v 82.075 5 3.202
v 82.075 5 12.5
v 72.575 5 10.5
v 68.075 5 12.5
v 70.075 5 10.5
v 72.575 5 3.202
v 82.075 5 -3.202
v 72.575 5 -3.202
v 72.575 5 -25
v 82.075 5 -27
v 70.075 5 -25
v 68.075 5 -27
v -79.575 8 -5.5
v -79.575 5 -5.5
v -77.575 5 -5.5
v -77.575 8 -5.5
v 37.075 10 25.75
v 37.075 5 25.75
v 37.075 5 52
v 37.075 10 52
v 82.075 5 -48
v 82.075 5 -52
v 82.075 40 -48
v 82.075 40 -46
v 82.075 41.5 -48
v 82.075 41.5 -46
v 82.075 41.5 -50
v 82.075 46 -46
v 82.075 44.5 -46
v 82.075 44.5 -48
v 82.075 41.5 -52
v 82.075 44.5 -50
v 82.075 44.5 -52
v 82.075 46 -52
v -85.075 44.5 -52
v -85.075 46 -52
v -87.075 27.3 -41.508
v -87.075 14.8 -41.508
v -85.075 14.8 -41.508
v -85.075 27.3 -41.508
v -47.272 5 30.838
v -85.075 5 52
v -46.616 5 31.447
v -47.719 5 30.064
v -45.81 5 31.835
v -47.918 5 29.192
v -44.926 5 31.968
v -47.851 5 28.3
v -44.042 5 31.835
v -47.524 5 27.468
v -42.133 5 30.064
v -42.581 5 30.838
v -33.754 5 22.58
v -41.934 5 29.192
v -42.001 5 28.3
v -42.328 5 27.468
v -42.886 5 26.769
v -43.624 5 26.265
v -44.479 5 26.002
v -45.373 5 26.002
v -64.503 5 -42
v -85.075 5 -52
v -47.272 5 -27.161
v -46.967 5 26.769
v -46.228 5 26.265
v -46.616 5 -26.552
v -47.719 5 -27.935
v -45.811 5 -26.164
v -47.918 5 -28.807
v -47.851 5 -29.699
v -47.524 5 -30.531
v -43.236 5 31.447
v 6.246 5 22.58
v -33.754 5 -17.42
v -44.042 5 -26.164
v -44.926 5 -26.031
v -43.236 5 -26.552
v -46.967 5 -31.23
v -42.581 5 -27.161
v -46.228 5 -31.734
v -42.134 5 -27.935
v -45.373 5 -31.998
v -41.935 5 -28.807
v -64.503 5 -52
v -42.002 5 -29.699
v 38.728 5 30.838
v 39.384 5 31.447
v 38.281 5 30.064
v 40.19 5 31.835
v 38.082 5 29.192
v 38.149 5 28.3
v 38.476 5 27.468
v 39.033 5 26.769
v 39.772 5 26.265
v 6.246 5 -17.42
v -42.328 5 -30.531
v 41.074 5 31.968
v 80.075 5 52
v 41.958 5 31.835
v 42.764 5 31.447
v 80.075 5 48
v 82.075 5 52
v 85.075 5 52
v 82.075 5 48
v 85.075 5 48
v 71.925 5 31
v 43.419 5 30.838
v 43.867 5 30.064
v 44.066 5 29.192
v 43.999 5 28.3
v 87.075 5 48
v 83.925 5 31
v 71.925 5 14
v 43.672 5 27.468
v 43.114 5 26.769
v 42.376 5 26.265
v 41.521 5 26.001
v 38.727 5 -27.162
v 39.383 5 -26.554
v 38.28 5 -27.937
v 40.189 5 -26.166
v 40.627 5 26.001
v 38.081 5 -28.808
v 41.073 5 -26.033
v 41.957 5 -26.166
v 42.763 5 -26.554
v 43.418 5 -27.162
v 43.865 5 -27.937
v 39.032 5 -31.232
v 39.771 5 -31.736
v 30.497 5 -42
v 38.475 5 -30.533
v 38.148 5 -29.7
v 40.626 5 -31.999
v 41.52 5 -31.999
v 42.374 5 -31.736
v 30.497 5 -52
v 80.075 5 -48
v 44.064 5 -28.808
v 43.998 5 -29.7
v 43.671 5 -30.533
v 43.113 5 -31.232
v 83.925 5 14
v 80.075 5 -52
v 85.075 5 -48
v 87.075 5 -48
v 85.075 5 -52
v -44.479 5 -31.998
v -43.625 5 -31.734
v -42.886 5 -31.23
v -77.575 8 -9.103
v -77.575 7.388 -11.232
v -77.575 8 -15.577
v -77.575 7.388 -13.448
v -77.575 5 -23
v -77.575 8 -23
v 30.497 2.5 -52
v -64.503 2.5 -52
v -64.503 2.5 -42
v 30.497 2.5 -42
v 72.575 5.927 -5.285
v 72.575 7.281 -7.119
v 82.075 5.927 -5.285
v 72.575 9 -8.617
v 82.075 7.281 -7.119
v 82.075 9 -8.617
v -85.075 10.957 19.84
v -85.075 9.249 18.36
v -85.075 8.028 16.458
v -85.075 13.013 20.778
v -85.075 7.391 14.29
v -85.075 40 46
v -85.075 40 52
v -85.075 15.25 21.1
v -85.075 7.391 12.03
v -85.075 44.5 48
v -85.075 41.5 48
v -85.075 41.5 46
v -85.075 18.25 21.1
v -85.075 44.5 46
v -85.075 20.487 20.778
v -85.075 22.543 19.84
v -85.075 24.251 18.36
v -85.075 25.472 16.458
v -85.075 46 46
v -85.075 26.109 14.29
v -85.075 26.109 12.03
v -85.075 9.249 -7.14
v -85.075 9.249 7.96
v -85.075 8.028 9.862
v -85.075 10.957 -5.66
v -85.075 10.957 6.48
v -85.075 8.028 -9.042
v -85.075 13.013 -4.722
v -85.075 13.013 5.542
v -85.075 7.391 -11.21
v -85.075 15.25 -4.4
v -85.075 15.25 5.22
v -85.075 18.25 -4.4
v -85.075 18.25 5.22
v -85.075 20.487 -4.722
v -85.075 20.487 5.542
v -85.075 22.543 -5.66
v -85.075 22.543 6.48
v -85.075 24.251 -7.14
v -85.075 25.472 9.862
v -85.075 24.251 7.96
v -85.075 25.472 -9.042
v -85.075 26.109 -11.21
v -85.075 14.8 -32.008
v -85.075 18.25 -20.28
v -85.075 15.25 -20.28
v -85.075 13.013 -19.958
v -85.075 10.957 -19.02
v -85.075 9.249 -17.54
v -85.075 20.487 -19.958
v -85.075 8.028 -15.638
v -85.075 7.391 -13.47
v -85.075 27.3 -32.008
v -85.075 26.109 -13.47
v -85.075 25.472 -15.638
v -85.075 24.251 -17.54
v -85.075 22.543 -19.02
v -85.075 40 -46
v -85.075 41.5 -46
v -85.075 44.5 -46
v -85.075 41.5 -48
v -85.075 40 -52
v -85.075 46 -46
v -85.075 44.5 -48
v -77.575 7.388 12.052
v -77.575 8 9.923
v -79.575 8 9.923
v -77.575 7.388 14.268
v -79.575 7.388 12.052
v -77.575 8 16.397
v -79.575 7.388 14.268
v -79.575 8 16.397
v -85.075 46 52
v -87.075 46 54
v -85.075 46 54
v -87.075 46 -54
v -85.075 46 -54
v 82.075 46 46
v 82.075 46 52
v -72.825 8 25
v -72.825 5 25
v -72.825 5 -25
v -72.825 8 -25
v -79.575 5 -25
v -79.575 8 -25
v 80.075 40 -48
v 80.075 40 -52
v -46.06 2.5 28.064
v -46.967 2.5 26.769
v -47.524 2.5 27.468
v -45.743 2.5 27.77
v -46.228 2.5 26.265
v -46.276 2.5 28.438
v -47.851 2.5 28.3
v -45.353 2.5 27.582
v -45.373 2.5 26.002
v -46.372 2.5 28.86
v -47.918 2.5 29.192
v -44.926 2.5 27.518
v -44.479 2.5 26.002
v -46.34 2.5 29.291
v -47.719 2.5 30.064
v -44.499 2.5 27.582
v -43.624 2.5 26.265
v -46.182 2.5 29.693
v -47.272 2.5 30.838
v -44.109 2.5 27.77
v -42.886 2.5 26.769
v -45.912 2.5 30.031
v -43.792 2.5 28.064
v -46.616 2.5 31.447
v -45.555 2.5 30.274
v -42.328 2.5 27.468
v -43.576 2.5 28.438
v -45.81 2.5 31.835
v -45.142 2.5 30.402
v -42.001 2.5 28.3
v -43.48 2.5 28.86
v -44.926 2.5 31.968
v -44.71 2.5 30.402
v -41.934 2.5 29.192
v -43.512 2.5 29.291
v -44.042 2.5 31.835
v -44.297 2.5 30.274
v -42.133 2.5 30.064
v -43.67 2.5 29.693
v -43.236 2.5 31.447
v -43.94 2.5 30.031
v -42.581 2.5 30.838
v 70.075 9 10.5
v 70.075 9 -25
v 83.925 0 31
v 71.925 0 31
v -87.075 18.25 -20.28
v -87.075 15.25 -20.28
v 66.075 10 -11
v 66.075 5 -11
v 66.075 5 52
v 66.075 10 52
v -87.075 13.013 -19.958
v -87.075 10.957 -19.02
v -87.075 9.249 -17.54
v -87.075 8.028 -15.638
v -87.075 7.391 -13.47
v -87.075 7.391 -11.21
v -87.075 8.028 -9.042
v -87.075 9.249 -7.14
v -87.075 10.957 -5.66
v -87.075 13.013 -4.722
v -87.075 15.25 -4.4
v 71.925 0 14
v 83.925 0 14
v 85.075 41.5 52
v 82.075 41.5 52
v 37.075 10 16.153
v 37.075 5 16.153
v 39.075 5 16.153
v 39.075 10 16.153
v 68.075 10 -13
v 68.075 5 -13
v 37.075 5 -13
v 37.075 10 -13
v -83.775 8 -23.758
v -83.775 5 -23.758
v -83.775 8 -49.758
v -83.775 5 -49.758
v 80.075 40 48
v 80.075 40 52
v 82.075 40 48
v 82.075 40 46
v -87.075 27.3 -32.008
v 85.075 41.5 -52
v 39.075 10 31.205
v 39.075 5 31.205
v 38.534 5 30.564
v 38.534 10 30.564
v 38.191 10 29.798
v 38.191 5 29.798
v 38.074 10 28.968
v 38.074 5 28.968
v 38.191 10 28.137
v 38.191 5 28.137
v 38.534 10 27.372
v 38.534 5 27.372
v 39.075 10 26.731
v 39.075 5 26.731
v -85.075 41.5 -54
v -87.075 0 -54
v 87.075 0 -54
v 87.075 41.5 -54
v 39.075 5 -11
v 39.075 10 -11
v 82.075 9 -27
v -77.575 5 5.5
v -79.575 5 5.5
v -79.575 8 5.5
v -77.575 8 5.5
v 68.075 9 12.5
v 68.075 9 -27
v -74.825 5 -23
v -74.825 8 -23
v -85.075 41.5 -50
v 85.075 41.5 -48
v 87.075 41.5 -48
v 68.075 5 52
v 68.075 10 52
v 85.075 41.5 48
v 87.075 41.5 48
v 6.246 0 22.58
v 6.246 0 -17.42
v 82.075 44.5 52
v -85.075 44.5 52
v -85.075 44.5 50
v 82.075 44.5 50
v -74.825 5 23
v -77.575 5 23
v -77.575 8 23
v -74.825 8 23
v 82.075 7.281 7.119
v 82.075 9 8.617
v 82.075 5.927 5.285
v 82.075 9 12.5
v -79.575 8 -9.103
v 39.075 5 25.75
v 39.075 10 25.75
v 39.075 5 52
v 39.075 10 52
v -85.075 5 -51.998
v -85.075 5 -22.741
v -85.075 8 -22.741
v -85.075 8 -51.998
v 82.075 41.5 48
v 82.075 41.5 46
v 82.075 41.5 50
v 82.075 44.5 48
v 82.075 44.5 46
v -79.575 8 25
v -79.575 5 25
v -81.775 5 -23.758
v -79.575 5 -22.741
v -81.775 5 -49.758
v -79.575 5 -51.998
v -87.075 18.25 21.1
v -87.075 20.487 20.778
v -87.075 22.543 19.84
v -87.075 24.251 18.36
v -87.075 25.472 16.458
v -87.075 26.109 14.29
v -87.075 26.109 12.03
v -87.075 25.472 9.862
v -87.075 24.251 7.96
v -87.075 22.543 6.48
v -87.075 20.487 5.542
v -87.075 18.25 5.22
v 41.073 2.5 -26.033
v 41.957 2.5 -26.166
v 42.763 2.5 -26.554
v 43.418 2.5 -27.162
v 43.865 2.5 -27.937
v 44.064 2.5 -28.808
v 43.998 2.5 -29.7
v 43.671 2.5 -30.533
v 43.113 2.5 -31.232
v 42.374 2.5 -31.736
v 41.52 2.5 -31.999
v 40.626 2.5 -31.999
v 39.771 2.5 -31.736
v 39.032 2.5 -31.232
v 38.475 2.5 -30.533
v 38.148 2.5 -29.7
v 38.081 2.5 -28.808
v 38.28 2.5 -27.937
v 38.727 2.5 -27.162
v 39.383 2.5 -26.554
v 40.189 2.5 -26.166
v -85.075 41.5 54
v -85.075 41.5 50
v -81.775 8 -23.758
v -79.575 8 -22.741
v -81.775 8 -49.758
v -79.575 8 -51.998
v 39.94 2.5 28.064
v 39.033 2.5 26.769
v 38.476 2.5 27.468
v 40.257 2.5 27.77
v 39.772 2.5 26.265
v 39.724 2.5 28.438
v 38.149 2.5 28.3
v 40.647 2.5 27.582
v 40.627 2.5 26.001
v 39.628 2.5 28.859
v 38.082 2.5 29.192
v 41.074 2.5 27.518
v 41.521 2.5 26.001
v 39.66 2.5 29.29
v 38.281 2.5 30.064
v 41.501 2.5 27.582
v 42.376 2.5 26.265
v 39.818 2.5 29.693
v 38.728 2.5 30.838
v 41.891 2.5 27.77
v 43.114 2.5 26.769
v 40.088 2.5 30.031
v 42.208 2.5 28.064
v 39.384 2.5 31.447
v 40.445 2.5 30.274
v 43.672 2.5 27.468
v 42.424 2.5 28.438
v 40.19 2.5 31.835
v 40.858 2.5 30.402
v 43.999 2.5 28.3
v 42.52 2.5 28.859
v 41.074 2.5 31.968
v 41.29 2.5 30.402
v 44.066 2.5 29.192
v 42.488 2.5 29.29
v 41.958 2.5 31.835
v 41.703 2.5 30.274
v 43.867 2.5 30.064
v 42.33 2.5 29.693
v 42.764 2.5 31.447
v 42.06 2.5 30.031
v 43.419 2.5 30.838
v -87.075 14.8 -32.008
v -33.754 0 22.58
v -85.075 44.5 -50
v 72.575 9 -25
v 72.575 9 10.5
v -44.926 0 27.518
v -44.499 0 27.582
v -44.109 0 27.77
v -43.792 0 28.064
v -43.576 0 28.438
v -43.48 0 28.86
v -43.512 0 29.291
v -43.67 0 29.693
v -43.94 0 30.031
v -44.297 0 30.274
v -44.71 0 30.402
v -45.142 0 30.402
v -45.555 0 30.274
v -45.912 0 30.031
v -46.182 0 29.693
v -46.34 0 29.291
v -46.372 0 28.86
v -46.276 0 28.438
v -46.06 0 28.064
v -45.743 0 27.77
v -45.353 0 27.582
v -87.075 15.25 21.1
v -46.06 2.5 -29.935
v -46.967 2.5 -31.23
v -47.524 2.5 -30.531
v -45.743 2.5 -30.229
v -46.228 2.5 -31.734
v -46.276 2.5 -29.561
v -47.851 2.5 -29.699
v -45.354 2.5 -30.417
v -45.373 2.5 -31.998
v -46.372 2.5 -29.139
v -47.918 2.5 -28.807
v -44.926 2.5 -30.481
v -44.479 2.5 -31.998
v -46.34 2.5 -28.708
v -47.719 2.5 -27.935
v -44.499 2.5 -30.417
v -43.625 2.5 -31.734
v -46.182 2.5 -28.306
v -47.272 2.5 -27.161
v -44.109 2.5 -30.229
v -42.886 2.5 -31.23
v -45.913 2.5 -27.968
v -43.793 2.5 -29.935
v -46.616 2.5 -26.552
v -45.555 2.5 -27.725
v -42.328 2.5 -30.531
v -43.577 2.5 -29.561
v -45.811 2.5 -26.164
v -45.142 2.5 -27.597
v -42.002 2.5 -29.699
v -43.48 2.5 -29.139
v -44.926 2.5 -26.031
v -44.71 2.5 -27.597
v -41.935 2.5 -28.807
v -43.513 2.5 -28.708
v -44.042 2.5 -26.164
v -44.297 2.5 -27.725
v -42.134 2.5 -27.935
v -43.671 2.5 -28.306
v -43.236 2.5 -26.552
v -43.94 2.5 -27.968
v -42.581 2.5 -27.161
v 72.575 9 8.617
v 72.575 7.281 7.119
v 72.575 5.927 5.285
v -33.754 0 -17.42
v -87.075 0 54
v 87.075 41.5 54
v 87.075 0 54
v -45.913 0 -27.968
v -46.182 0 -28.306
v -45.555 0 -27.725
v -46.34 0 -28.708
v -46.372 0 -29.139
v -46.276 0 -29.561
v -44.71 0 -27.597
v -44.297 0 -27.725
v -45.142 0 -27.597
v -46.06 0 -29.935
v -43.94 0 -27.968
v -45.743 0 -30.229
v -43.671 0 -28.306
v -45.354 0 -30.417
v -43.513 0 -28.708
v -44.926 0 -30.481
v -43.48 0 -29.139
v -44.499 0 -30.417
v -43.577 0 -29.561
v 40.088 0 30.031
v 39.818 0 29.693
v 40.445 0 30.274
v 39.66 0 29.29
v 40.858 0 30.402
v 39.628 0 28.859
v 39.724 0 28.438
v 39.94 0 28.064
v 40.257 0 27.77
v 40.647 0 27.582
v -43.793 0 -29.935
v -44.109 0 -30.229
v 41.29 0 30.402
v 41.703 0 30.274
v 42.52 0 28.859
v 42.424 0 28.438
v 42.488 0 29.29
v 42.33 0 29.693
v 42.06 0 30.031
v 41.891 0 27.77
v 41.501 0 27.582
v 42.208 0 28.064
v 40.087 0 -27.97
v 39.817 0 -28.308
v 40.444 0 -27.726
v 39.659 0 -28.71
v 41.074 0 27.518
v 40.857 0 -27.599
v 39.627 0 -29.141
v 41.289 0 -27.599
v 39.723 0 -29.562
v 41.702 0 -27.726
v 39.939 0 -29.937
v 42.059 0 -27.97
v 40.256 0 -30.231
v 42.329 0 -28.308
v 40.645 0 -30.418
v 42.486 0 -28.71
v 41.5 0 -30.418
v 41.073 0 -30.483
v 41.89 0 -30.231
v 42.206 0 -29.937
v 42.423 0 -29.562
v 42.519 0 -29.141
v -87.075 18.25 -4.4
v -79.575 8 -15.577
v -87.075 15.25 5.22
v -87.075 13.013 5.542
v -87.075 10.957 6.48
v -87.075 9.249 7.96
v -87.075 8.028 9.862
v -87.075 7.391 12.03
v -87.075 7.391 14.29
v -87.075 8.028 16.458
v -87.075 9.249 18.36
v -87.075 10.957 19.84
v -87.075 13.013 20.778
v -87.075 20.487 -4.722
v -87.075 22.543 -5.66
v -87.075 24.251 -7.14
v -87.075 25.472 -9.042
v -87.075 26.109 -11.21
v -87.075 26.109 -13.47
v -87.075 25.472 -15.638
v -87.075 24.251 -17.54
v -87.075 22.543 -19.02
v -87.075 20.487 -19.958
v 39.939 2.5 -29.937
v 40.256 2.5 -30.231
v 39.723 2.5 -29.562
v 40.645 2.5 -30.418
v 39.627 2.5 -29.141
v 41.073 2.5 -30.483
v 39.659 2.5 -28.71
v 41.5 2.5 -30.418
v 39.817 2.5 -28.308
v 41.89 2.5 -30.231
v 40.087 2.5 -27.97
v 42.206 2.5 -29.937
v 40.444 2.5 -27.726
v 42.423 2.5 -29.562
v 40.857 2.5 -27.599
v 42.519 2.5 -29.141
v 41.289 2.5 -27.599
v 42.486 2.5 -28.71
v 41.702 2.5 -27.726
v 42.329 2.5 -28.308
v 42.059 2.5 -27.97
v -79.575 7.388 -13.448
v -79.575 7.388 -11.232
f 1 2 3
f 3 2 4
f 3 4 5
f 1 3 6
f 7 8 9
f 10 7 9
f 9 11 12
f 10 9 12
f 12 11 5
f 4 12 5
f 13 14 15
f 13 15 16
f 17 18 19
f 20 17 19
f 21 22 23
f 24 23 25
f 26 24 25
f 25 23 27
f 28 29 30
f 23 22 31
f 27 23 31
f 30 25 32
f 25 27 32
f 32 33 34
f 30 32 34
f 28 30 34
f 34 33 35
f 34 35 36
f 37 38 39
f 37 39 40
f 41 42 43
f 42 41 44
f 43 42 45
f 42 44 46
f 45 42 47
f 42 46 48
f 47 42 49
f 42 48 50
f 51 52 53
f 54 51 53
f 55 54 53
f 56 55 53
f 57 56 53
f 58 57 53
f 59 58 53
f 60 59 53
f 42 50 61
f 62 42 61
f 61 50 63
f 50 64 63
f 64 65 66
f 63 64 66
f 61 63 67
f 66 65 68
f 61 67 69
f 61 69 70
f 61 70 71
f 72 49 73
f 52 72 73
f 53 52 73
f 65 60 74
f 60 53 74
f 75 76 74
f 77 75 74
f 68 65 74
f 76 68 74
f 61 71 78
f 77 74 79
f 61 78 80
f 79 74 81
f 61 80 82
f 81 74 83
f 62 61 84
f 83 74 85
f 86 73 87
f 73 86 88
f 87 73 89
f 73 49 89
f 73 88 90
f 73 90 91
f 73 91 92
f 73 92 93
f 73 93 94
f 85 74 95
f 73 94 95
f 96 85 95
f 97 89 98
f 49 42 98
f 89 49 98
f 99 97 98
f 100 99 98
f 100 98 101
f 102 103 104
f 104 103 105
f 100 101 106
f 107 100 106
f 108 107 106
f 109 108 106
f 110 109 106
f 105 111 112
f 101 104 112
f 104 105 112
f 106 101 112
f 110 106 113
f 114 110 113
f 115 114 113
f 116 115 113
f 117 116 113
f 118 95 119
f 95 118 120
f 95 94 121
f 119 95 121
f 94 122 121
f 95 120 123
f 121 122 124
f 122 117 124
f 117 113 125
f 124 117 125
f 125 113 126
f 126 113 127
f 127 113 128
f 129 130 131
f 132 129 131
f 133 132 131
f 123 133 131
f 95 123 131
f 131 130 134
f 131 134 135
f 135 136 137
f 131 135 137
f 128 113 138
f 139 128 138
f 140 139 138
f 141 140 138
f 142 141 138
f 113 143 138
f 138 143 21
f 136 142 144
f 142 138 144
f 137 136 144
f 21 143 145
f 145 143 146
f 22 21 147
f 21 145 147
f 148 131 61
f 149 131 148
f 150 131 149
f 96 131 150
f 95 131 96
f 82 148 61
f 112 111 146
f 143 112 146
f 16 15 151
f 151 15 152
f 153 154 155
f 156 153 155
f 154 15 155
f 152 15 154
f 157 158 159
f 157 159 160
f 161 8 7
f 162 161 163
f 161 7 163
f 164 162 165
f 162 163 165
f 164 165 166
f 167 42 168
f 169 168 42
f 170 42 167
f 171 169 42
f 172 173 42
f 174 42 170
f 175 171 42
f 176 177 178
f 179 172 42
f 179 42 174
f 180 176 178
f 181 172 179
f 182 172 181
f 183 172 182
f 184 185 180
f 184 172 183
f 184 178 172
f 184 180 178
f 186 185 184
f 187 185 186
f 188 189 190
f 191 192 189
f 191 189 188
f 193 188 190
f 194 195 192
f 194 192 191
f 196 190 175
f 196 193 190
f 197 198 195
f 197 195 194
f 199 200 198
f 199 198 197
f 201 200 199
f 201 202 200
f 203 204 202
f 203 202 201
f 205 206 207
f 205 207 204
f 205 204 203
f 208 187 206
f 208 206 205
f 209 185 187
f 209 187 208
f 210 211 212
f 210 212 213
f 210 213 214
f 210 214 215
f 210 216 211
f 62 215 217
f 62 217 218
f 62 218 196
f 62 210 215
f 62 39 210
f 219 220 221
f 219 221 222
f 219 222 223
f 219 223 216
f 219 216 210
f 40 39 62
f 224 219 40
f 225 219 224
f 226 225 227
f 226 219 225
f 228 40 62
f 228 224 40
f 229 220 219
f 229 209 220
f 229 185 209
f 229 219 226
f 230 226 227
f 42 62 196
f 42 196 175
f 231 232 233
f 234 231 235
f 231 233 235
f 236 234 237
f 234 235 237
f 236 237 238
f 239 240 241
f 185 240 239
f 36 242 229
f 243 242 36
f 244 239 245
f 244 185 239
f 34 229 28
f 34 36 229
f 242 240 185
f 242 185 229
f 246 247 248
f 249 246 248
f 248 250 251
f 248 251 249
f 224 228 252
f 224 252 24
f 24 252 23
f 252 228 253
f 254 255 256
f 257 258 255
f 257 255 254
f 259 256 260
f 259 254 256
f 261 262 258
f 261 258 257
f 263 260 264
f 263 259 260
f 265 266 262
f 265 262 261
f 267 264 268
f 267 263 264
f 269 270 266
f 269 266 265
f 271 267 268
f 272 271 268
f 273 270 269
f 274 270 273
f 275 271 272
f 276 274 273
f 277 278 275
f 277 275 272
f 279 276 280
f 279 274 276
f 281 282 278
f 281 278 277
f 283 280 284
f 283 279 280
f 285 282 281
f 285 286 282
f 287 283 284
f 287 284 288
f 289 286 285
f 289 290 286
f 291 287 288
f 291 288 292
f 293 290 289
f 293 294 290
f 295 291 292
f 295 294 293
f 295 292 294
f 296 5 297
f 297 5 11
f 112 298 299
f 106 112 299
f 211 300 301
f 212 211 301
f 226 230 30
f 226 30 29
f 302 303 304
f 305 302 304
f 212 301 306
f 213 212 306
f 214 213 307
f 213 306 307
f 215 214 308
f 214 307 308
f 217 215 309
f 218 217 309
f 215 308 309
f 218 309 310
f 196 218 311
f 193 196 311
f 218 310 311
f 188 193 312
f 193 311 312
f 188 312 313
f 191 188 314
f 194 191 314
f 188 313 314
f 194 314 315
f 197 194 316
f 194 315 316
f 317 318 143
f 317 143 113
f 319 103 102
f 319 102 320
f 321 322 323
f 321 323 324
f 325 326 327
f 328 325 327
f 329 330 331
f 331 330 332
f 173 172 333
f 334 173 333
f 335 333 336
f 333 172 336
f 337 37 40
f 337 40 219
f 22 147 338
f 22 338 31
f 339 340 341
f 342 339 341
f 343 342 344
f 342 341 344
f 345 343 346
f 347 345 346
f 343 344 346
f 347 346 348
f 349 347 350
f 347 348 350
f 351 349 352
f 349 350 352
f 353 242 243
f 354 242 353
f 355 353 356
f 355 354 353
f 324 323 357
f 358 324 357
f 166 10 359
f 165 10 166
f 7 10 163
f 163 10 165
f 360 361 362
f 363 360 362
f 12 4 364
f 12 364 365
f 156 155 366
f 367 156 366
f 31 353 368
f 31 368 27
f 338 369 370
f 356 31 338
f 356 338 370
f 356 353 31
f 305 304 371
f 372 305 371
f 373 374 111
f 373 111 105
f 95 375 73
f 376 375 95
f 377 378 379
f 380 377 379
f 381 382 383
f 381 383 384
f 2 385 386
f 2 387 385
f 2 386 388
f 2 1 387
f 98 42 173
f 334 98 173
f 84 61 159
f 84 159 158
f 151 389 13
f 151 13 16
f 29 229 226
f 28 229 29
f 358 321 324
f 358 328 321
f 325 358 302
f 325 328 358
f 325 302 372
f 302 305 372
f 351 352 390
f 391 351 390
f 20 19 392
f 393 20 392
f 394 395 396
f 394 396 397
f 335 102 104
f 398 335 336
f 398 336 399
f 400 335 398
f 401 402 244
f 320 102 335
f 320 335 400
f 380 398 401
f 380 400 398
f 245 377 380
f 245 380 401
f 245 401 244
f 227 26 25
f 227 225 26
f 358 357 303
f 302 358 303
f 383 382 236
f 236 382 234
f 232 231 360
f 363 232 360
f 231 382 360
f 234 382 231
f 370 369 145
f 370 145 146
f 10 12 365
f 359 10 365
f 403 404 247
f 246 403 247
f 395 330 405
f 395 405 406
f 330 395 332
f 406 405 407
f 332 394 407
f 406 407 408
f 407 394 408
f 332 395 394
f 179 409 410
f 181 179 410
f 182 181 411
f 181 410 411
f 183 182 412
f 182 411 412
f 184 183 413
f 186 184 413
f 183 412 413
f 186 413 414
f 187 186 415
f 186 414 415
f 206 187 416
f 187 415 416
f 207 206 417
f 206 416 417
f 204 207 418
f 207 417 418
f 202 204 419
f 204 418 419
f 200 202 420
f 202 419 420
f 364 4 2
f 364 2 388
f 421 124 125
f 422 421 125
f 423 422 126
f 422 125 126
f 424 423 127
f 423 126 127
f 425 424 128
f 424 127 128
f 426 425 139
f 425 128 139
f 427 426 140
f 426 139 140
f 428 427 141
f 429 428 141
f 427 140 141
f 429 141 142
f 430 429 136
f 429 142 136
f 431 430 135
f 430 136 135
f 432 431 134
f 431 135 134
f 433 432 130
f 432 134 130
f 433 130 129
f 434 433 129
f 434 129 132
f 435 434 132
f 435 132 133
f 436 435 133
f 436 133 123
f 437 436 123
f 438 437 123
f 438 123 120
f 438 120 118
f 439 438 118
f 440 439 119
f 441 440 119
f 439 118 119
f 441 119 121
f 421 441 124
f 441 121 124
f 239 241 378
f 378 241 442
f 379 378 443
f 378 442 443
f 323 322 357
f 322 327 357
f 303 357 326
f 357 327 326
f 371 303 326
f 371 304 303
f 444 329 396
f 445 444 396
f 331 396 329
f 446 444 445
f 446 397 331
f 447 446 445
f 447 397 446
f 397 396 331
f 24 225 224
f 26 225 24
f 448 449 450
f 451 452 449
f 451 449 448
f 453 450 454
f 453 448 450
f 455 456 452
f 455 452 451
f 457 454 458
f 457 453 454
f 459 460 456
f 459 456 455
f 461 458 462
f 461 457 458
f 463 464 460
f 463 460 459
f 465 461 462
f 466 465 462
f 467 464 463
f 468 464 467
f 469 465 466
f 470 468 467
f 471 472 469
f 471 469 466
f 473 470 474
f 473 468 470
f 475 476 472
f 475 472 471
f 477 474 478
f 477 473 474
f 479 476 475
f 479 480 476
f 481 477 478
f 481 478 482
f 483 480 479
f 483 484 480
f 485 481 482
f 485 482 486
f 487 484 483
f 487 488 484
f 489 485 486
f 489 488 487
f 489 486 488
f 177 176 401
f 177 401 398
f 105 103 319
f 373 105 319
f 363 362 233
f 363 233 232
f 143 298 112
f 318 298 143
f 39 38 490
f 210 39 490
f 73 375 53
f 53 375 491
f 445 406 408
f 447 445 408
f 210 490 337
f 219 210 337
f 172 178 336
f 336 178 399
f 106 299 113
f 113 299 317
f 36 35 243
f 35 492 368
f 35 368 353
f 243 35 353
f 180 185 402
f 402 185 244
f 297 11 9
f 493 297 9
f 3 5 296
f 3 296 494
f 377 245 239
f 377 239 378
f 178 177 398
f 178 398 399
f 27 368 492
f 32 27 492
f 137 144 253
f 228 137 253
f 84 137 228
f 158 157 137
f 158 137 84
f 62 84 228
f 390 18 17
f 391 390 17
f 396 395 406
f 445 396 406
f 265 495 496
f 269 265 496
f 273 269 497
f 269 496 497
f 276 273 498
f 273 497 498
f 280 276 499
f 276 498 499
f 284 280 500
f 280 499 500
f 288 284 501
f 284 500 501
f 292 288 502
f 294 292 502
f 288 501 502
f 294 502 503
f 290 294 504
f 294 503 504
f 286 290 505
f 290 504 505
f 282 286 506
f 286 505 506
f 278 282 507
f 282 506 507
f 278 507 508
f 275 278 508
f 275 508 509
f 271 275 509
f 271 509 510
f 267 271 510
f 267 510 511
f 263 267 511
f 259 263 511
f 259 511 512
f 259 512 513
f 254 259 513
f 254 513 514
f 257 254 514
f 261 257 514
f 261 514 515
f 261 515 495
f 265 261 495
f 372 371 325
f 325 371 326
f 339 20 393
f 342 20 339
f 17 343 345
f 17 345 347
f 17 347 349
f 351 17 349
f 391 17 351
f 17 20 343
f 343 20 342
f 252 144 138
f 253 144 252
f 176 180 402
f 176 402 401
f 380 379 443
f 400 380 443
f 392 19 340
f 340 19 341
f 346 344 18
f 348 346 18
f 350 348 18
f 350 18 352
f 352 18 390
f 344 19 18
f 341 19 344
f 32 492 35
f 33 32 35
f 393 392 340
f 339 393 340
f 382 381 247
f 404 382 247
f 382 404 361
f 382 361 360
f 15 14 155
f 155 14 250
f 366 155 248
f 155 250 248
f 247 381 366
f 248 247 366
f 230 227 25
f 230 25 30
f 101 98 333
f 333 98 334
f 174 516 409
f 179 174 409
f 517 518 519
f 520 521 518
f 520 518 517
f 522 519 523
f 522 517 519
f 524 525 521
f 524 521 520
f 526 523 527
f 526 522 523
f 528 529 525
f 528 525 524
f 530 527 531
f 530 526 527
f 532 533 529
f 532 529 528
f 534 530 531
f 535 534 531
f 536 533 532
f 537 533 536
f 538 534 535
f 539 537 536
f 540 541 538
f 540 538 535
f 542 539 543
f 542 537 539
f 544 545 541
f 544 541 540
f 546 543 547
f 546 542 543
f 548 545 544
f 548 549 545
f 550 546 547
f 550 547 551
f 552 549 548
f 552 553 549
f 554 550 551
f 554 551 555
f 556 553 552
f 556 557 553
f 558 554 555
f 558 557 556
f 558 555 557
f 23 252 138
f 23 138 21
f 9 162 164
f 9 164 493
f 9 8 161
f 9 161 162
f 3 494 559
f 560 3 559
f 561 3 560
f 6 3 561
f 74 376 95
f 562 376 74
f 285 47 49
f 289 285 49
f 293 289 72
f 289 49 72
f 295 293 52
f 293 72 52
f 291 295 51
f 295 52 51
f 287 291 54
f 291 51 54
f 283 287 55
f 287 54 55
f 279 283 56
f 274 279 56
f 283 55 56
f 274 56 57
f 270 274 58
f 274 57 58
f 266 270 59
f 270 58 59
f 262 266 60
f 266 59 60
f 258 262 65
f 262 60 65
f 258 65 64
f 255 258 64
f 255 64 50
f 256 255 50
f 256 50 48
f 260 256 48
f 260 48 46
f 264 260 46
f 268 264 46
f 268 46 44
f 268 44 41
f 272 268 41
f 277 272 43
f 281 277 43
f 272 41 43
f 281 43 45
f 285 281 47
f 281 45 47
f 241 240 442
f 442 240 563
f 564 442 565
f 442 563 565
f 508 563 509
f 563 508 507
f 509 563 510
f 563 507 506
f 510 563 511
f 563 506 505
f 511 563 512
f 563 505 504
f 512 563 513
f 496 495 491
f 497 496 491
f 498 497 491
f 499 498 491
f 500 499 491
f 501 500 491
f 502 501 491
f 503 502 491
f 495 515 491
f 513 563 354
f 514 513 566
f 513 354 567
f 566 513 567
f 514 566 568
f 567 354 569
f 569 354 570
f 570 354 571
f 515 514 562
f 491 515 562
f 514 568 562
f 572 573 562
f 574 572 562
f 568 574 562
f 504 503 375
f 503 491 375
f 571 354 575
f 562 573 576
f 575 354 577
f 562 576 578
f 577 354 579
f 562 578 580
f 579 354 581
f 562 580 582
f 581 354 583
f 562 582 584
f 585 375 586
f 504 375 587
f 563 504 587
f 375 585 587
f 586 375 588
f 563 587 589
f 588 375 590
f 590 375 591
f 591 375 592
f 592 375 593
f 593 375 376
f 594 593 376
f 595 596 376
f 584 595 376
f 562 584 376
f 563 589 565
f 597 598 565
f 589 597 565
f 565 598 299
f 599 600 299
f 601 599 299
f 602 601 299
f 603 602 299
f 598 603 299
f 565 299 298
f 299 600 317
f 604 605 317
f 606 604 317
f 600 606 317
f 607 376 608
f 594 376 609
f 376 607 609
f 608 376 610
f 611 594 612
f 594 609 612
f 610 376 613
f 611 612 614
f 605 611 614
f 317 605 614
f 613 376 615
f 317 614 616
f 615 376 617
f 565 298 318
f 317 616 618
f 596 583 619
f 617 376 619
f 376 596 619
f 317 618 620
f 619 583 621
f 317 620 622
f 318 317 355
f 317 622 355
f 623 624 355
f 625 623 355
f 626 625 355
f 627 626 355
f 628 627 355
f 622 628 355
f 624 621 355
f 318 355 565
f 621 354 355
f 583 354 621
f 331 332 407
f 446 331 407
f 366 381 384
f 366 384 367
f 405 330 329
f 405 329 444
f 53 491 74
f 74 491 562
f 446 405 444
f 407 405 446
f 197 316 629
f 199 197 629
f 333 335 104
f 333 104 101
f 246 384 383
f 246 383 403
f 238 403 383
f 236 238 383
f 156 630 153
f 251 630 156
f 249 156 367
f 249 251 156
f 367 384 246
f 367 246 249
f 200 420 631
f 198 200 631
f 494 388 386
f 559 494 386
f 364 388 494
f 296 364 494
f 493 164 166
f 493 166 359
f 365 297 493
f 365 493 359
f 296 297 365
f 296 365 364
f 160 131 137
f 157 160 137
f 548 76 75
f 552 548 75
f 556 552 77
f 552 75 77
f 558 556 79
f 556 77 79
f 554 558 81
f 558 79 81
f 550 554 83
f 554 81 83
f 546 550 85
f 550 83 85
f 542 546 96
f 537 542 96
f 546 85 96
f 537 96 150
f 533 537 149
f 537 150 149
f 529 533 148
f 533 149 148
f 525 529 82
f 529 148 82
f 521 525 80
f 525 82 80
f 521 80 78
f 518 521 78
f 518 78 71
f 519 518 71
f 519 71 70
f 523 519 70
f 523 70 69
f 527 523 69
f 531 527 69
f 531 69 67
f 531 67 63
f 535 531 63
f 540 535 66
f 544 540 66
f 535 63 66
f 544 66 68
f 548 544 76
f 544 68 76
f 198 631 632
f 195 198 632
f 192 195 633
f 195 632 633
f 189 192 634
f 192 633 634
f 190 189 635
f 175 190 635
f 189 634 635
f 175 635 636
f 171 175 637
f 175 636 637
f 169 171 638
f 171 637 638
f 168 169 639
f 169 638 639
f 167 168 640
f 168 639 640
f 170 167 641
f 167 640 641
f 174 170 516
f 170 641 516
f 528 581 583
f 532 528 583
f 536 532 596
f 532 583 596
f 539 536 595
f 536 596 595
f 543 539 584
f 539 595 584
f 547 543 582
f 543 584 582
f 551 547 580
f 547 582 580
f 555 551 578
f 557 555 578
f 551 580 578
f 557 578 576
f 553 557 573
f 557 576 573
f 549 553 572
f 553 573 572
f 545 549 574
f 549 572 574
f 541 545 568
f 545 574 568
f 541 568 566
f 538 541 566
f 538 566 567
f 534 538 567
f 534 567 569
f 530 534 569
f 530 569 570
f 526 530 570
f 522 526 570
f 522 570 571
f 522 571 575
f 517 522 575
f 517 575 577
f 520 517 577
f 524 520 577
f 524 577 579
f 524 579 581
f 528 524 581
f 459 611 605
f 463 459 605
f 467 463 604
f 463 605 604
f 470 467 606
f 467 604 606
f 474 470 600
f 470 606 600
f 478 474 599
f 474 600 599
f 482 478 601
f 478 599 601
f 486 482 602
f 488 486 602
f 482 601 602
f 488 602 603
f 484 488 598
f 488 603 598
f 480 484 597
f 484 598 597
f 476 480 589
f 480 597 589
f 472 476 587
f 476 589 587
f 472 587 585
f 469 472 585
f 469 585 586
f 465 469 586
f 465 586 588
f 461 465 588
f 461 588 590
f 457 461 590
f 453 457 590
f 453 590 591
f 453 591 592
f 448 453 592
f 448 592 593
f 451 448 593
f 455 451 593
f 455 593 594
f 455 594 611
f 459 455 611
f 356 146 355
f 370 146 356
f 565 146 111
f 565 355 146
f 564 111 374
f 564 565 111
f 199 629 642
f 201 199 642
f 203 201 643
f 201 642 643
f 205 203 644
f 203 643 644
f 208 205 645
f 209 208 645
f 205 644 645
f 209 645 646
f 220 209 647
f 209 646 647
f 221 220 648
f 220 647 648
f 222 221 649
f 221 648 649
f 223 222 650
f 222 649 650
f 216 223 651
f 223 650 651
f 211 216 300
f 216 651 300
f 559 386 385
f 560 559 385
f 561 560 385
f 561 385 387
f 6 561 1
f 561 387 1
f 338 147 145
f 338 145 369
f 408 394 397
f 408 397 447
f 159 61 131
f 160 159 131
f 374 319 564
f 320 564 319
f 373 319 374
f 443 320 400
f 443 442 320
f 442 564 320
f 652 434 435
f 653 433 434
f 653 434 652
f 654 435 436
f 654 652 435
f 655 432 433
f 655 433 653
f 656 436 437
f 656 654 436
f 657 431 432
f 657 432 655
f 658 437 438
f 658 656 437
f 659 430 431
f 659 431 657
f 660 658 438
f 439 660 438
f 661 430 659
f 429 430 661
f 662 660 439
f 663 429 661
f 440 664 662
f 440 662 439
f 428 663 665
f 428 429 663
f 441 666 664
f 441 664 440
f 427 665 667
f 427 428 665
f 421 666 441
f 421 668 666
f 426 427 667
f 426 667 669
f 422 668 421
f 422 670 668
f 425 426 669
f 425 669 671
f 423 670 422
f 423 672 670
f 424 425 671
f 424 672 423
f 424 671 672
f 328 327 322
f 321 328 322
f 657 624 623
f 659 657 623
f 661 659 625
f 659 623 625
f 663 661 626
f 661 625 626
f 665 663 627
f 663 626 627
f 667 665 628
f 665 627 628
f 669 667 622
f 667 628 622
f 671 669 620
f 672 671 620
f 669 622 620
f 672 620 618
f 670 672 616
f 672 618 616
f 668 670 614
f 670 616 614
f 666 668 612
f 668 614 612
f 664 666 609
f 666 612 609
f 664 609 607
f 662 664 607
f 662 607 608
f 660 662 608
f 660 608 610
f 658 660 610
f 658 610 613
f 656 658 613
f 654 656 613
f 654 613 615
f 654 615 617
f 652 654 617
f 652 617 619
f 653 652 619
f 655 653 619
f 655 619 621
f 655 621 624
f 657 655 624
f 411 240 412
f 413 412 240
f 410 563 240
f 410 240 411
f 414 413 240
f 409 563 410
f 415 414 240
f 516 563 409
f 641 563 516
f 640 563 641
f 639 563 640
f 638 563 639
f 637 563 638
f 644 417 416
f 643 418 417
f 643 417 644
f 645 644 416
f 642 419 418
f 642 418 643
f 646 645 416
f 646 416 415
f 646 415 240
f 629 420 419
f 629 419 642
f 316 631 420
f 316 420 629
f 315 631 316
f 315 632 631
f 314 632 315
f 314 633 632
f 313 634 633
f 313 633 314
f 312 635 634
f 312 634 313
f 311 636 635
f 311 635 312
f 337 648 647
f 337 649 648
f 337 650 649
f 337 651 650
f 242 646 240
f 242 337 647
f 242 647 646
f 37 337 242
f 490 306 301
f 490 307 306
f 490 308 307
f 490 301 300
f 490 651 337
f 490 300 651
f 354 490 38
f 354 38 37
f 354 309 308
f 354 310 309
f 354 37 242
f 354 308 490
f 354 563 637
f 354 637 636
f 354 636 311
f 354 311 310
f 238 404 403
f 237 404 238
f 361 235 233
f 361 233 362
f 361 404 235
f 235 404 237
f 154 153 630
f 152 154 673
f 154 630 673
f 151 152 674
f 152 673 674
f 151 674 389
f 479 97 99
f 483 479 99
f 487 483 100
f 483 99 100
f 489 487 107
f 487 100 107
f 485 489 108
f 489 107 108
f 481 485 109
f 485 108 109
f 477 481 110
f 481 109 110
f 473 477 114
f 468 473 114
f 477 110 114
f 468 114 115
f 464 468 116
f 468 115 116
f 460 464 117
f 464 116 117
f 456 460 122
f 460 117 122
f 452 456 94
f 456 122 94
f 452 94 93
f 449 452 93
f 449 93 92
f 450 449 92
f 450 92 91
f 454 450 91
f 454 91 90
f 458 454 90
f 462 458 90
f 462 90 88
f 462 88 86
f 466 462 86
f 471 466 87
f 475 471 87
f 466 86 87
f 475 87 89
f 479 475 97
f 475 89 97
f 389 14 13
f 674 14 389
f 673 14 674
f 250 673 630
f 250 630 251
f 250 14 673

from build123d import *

# Parameters (mm, degrees)
SKETCH_1_W           = 174.15
SKETCH_1_H           = 108
EXTRUDE_1_DEPTH      = 63
SKETCH_2_W           = 104
SKETCH_2_H           = 56
CUT_EXTRUDE_1_DEPTH  = 172.15
SKETCH_3_W           = 174.15
SKETCH_3_H           = 108
CUT_EXTRUDE_2_DEPTH  = 2
CUT_EXTRUDE_3_DEPTH  = 10
SKETCH_4_W           = 6.75
SKETCH_4_H           = 50
SKETCH_4_W_2         = 2.75
SKETCH_4_H_2         = 46
EXTRUDE_2_DEPTH      = 3
SKETCH_6_R           = 7.94
CUT_EXTRUDE_4_DEPTH  = 3
SKETCH_7_W           = 11
SKETCH_7_H           = 3
CUT_EXTRUDE_5_DEPTH  = 3
SKETCH_13_W          = 6.5
SKETCH_13_H          = 39.5
SKETCH_13_W_2        = 2.5
SKETCH_13_H_2        = 35.5
EXTRUDE_5_DEPTH      = 4
SKETCH_14_W          = 39.5
SKETCH_14_H          = 4
EXTRUDE_6_DEPTH      = 12.5
CUT_EXTRUDE_9_DEPTH  = 14.5
SKETCH_16_R          = 1.45
SKETCH_16_W          = 12
SKETCH_16_H          = 17
CUT_EXTRUDE_10_DEPTH = 5
SKETCH_17_R          = 3
CUT_EXTRUDE_11_DEPTH = 2.5
EXTRUDE_7_DEPTH      = 5
SKETCH_20_W          = 9.597876209
SKETCH_20_H          = 5
CUT_EXTRUDE_13_DEPTH = 5
SKETCH_22_W          = 174.15
SKETCH_22_H          = 108
CUT_EXTRUDE_14_DEPTH = 15
SKETCH_29_W          = 40
SKETCH_29_H          = 40
CUT_EXTRUDE_21_DEPTH = 5
SKETCH_30_W          = 95
SKETCH_30_H          = 10
CUT_EXTRUDE_22_DEPTH = 2.5
SKETCH_36_W          = 172.15
SKETCH_36_H          = 6
EXTRUDE_12_DEPTH     = 6
CUT_EXTRUDE_START    = -174.15
CUT_EXTRUDE_27_DEPTH = 174.15
SKETCH_38_W          = 88
SKETCH_38_H          = 4.5
CUT_EXTRUDE_28_DEPTH = 10
SKETCH_41_W          = 2
SKETCH_41_H          = 108
EXTRUDE_15_DEPTH     = 4.5
CUT_EXTRUDE_START_2  = -41
CUT_EXTRUDE_29_DEPTH = 41
SKETCH_43_W          = 2
SKETCH_43_H          = 35
EXTRUDE_17_DEPTH     = 4
SKETCH_44_W          = 2
SKETCH_44_H          = 35
EXTRUDE_18_DEPTH     = 4
SKETCH_48_W          = 9.5
SKETCH_48_H          = 12.5
CUT_EXTRUDE_30_DEPTH = 10
SKETCH_49_W          = 5.5
SKETCH_49_H          = 29.256745024
SKETCH_49_W_2        = 2
SKETCH_49_H_2        = 26
EXTRUDE_19_DEPTH     = 3
SKETCH_51_W          = 2
SKETCH_51_H          = 104
CUT_EXTRUDE_31_DEPTH = 4.5
SKETCH_52_W          = 2
SKETCH_52_H          = 35
EXTRUDE_20_DEPTH     = 4
SKETCH_53_W          = 2
SKETCH_53_H          = 35
EXTRUDE_21_DEPTH     = 4


# Read off the part's stored shape, not the designer's step: 컷-돌출29
with BuildPart() as part:
    # 스케치1 → 보스-돌출1 (new body)
    with BuildSketch(Plane(origin=(0, 0, 0), x_dir=(1, 0, 0), z_dir=(0, 1, 0))):
        Rectangle(SKETCH_1_W, SKETCH_1_H)
    extrude(amount=EXTRUDE_1_DEPTH)

    # 스케치2 → 컷-돌출1 (cut)
    with BuildSketch(Plane(origin=(87.075, 0, 0), x_dir=(0, 0, -1), z_dir=(1, 0, 0))):
        with Locations((0, 33)):
            Rectangle(SKETCH_2_W, SKETCH_2_H)
    extrude(amount=-CUT_EXTRUDE_1_DEPTH, mode=Mode.SUBTRACT)

    # 스케치3 → 컷-돌출2 (cut)
    with BuildSketch(Plane(origin=(0, 63, 0), x_dir=(1, 0, 0), z_dir=(0, 1, 0))):
        Rectangle(SKETCH_3_W, SKETCH_3_H)
    extrude(amount=-CUT_EXTRUDE_2_DEPTH, mode=Mode.SUBTRACT)

    # 스케치5 → 컷-돌출3 (cut)
    with BuildSketch(Plane.ZY.offset(87.075)):
        with BuildLine():
            Line((-20.28, 18.25), (-20.28, 15.25))
            ThreePointArc((-20.28, 15.25), (-12.34, 7.31), (-4.4, 15.25))
            Line((-4.4, 15.25), (-4.4, 18.25))
            ThreePointArc((-4.4, 18.25), (-12.34, 26.19), (-20.28, 18.25))
        make_face()
        with BuildLine():
            Line((5.22, 18.25), (5.22, 15.25))
            ThreePointArc((5.22, 15.25), (13.16, 7.31), (21.1, 15.25))
            Line((21.1, 15.25), (21.1, 18.25))
            ThreePointArc((21.1, 18.25), (13.16, 26.19), (5.22, 18.25))
        make_face()
    extrude(amount=-CUT_EXTRUDE_3_DEPTH, mode=Mode.SUBTRACT)

    # 스케치16 → 컷-돌출10 (cut)
    with BuildSketch(Plane(origin=(0, 0, 0), x_dir=(-1, 0, 0), z_dir=(0, -1, 0))):
        with Locations(Location((44.92609, -28.96802, 0), (0, 0, 90))):
            Circle(SKETCH_16_R)
        with Locations(Location((44.92629, 29.0311, 0), (0, 0, 90))):
            Circle(SKETCH_16_R)
        with Locations(Location((-41.07277, 29.03265, 0), (0, 0, 90))):
            Circle(SKETCH_16_R)
        with Locations(Location((-41.0739, -28.96784, 0), (0, 0, 90))):
            Circle(SKETCH_16_R)
        with Locations((-77.925, -22.5)):
            Rectangle(SKETCH_16_W, SKETCH_16_H)
    extrude(amount=-CUT_EXTRUDE_10_DEPTH, mode=Mode.SUBTRACT)

    # 스케치17 → 컷-돌출11 (cut)
    with BuildSketch(Plane(origin=(0, 5, 0), x_dir=(1, 0, 0), z_dir=(0, 1, 0))):
        with Locations(Location((-44.92629, 29.0311, 0), (0, 0, 270))):
            Circle(SKETCH_17_R)
        with Locations(Location((-44.92609, -28.96802, 0), (0, 0, 270))):
            Circle(SKETCH_17_R)
        with Locations(Location((41.07277, 29.03265, 0), (0, 0, 270))):
            Circle(SKETCH_17_R)
        with Locations(Location((41.0739, -28.96784, 0), (0, 0, 270))):
            Circle(SKETCH_17_R)
    extrude(amount=-CUT_EXTRUDE_11_DEPTH, mode=Mode.SUBTRACT)

    # 스케치22 → 컷-돌출14 (cut)
    with BuildSketch(Plane(origin=(0, 46, 0), x_dir=(1, 0, 0), z_dir=(0, 1, 0))):
        Rectangle(SKETCH_22_W, SKETCH_22_H)
    extrude(amount=CUT_EXTRUDE_14_DEPTH, mode=Mode.SUBTRACT)

    # 스케치29 → 컷-돌출21 (cut)
    with BuildSketch(Plane(origin=(0, 0, 0), x_dir=(-1, 0, 0), z_dir=(0, -1, 0))):
        with Locations((13.754205887, -2.580173459)):
            Rectangle(SKETCH_29_W, SKETCH_29_H)
    extrude(amount=-CUT_EXTRUDE_21_DEPTH, mode=Mode.SUBTRACT)

    # 스케치30 → 컷-돌출22 (cut)
    with BuildSketch(Plane(origin=(0, 5, 0), x_dir=(1, 0, 0), z_dir=(0, 1, 0))):
        with Locations((-17.002844683, 47)):
            Rectangle(SKETCH_30_W, SKETCH_30_H)
    extrude(amount=-CUT_EXTRUDE_22_DEPTH, mode=Mode.SUBTRACT)

    # 스케치36 → 보스-돌출12 (add)
    with BuildSketch(Plane(origin=(0, 46, 0), x_dir=(1, 0, 0), z_dir=(0, 1, 0))):
        with Locations((1, 49)):
            Rectangle(SKETCH_36_W, SKETCH_36_H)
        with Locations((1, -49)):
            Rectangle(SKETCH_36_W, SKETCH_36_H)
    extrude(amount=-EXTRUDE_12_DEPTH)

    # 스케치37 → 컷-돌출27 (cut)
    with BuildSketch(Plane(origin=(87.075, 0, 0), x_dir=(0, 0, -1), z_dir=(1, 0, 0)).offset(CUT_EXTRUDE_START)):
        Polygon((-46, 44.5), (-48, 44.5), (-48, 41.5), (-46, 41.5), (-44, 41.5), (-44, 46), (-46, 46), align=None)
        Polygon((-50, 44.5), (-50, 41.5), (-52, 41.5), (-54, 41.5), (-54, 46), (-52, 46), (-52, 44.5), align=None)
        Polygon((46, 44.5), (46, 46), (44, 46), (44, 41.5), (46, 41.5), (48, 41.5), (48, 44.5), align=None)
        Polygon((54, 41.5), (52, 41.5), (50, 41.5), (50, 44.5), (52, 44.5), (52, 46), (54, 46), align=None)
    extrude(amount=CUT_EXTRUDE_27_DEPTH, mode=Mode.SUBTRACT)

    # 스케치38 → 컷-돌출28 (cut)
    with BuildSketch(Plane.ZY.offset(87.075)):
        with Locations((0, 43.75)):
            Rectangle(SKETCH_38_W, SKETCH_38_H)
    extrude(amount=-CUT_EXTRUDE_28_DEPTH, mode=Mode.SUBTRACT)

    # 스케치41 → 보스-돌출15 (add)
    with BuildSketch(Plane(origin=(0, 41.5, 0), x_dir=(1, 0, 0), z_dir=(0, 1, 0))):
        with Locations((-86.075, 0)):
            Rectangle(SKETCH_41_W, SKETCH_41_H)
    extrude(amount=EXTRUDE_15_DEPTH)


with BuildPart() as body_2:
    # 스케치4 → 보스-돌출2 (new body)
    with BuildSketch(Plane(origin=(0, 5, 0), x_dir=(1, 0, 0), z_dir=(0, 1, 0))):
        with Locations((-76.2, 0)):
            Rectangle(SKETCH_4_W, SKETCH_4_H)
        with Locations((-76.2, 0)):
            Rectangle(SKETCH_4_W_2, SKETCH_4_H_2, mode=Mode.SUBTRACT)
    extrude(amount=EXTRUDE_2_DEPTH)

    # 스케치6 → 컷-돌출4 (cut)
    with BuildSketch(Plane.ZY.offset(79.575)):
        with Locations((-12.34, 15.25)):
            Circle(SKETCH_6_R)
        with Locations((13.16, 15.25)):
            Circle(SKETCH_6_R)
    extrude(amount=-CUT_EXTRUDE_4_DEPTH, mode=Mode.SUBTRACT)

    # 스케치7 → 컷-돌출5 (cut)
    with BuildSketch(Plane.ZY.offset(79.575)):
        with Locations((0, 6.5)):
            Rectangle(SKETCH_7_W, SKETCH_7_H)
    extrude(amount=-CUT_EXTRUDE_5_DEPTH, mode=Mode.SUBTRACT)


with BuildPart() as body_3:
    # 스케치13 → 보스-돌출5 (new body)
    with BuildSketch(Plane(origin=(0, 5, 0), x_dir=(1, 0, 0), z_dir=(0, 1, 0))):
        with Locations((71.325, 7.25)):
            Rectangle(SKETCH_13_W, SKETCH_13_H)
        with Locations((71.325, 7.25)):
            Rectangle(SKETCH_13_W_2, SKETCH_13_H_2, mode=Mode.SUBTRACT)
    extrude(amount=EXTRUDE_5_DEPTH)

    # 스케치14 → 보스-돌출6 (add)
    with BuildSketch(Plane(origin=(74.575, 0, 0), x_dir=(0, 0, -1), z_dir=(1, 0, 0))):
        with Locations((7.25, 7)):
            Rectangle(SKETCH_14_W, SKETCH_14_H)
    extrude(amount=EXTRUDE_6_DEPTH)

    # 스케치15 → 컷-돌출9 (cut)
    with BuildSketch(Plane(origin=(87.075, 0, 0), x_dir=(0, 0, -1), z_dir=(1, 0, 0))):
        with BuildLine():
            Line((8.61684397, 9), (-8.61684397, 9))
            ThreePointArc((-8.61684397, 9), (-6.23848384, 6.554212921), (-3.201562119, 5))
            Line((-3.201562119, 5), (3.201562119, 5))
            ThreePointArc((3.201562119, 5), (6.23848384, 6.554212921), (8.61684397, 9))
        make_face()
    extrude(amount=-CUT_EXTRUDE_9_DEPTH, mode=Mode.SUBTRACT)


with BuildPart() as body_4:
    # 스케치19 → 보스-돌출7 (new body)
    with BuildSketch(Plane(origin=(0, 5, 0), x_dir=(1, 0, 0), z_dir=(0, 1, 0))):
        with BuildLine():
            ThreePointArc((39.075, -31.204891361), (38.0739, -28.96784), (39.075, -26.730788639))
            Line((39.075, -26.730788639), (39.075, 11))
            Line((39.075, 11), (66.075, 11))
            Line((66.075, 11), (66.075, -52))
            Line((66.075, -52), (68.075, -52))
            Line((68.075, -52), (68.075, 13))
            Line((68.075, 13), (37.075, 13))
            Line((37.075, 13), (37.075, -52))
            Line((37.075, -52), (39.075, -52))
            Line((39.075, -52), (39.075, -31.204891361))
        make_face()
    extrude(amount=EXTRUDE_7_DEPTH)

    # 스케치20 → 컷-돌출13 (cut)
    with BuildSketch(Plane.ZY.offset(-37.075)):
        with Locations((20.951522743, 7.5)):
            Rectangle(SKETCH_20_W, SKETCH_20_H)
    extrude(amount=-CUT_EXTRUDE_13_DEPTH, mode=Mode.SUBTRACT)


with BuildPart() as cut_extrude_13_piece_1:
    # of the separate pieces the step leaves, piece 1, a body of its own (cut_extrude_13_pieces)
    add(body_4.part.solids().sort_by_distance((39.075, 5, 16.152584639))[0])


with BuildPart() as cut_extrude_13_piece_2:
    # of the separate pieces the step leaves, piece 2, a body of its own (cut_extrude_13_pieces)
    add(body_4.part.solids().sort_by_distance((39.075, 5, 31.204891361))[0])


with BuildPart() as cut_extrude_29_tool:
    # 컷-돌출29 outline → 컷-돌출29 (new body)
    with BuildSketch(Plane(origin=(0, 46, 0), x_dir=(1, 0, 0), z_dir=(0, 1, 0)).offset(CUT_EXTRUDE_START_2)):
        Polygon((85.075, 52), (82.075, 52), (82.075, -52), (85.075, -52), (85.075, -48), (87.075, -48), (87.075, 48), (85.075, 48), align=None)
    extrude(amount=CUT_EXTRUDE_29_DEPTH)


with BuildPart() as part_1:
    add(part.part)

    # 컷-돌출29: cut by cut_extrude_29_tool
    add(cut_extrude_29_tool.part, mode=Mode.SUBTRACT)

    # 스케치43 → 보스-돌출17 (add)
    with BuildSketch(Plane.XY.offset(-52)):
        with Locations((86.075, 22.5)):
            Rectangle(SKETCH_43_W, SKETCH_43_H)
    extrude(amount=EXTRUDE_17_DEPTH)

    # 스케치44 → 보스-돌출18 (add)
    with BuildSketch(Plane(origin=(0, 0, 52), x_dir=(-1, 0, 0), z_dir=(0, 0, -1))):
        with Locations((-86.075, 22.5)):
            Rectangle(SKETCH_44_W, SKETCH_44_H)
    extrude(amount=EXTRUDE_18_DEPTH)

    # 스케치48 → 컷-돌출30 (cut)
    with BuildSketch(Plane.ZY.offset(87.075)):
        with Locations((-36.757528825, 21.05)):
            Rectangle(SKETCH_48_W, SKETCH_48_H)
    extrude(amount=-CUT_EXTRUDE_30_DEPTH, mode=Mode.SUBTRACT)

    # 스케치51 → 컷-돌출31 (cut)
    with BuildSketch(Plane(origin=(0, 46, 0), x_dir=(1, 0, 0), z_dir=(0, 1, 0))):
        with Locations((86.075, 0)):
            Rectangle(SKETCH_51_W, SKETCH_51_H)
    extrude(amount=-CUT_EXTRUDE_31_DEPTH, mode=Mode.SUBTRACT)

    # 스케치52 → 보스-돌출20 (add)
    with BuildSketch(Plane.XY.offset(-52)):
        with Locations((81.075, 22.5)):
            Rectangle(SKETCH_52_W, SKETCH_52_H)
    extrude(amount=EXTRUDE_20_DEPTH)

    # 스케치53 → 보스-돌출21 (add)
    with BuildSketch(Plane(origin=(0, 0, 52), x_dir=(-1, 0, 0), z_dir=(0, 0, -1))):
        with Locations((-81.075, 22.5)):
            Rectangle(SKETCH_53_W, SKETCH_53_H)
    extrude(amount=EXTRUDE_21_DEPTH)


with BuildPart() as body_3_1:
    add(body_3.part)

    # 컷-돌출29: cut by cut_extrude_29_tool
    add(cut_extrude_29_tool.part, mode=Mode.SUBTRACT)


with BuildPart() as body_6:
    # 스케치49 → 보스-돌출19 (new body)
    with BuildSketch(Plane(origin=(0, 5, 0), x_dir=(1, 0, 0), z_dir=(0, 1, 0))):
        with Locations((-82.325, 37.369156313)):
            Rectangle(SKETCH_49_W, SKETCH_49_H)
        with Locations((-82.775, 36.757528825)):
            Rectangle(SKETCH_49_W_2, SKETCH_49_H_2, mode=Mode.SUBTRACT)
    extrude(amount=EXTRUDE_19_DEPTH)


solid = Compound([body_2.part, cut_extrude_13_piece_1.part, cut_extrude_13_piece_2.part, part_1.part, body_3_1.part, body_6.part])
